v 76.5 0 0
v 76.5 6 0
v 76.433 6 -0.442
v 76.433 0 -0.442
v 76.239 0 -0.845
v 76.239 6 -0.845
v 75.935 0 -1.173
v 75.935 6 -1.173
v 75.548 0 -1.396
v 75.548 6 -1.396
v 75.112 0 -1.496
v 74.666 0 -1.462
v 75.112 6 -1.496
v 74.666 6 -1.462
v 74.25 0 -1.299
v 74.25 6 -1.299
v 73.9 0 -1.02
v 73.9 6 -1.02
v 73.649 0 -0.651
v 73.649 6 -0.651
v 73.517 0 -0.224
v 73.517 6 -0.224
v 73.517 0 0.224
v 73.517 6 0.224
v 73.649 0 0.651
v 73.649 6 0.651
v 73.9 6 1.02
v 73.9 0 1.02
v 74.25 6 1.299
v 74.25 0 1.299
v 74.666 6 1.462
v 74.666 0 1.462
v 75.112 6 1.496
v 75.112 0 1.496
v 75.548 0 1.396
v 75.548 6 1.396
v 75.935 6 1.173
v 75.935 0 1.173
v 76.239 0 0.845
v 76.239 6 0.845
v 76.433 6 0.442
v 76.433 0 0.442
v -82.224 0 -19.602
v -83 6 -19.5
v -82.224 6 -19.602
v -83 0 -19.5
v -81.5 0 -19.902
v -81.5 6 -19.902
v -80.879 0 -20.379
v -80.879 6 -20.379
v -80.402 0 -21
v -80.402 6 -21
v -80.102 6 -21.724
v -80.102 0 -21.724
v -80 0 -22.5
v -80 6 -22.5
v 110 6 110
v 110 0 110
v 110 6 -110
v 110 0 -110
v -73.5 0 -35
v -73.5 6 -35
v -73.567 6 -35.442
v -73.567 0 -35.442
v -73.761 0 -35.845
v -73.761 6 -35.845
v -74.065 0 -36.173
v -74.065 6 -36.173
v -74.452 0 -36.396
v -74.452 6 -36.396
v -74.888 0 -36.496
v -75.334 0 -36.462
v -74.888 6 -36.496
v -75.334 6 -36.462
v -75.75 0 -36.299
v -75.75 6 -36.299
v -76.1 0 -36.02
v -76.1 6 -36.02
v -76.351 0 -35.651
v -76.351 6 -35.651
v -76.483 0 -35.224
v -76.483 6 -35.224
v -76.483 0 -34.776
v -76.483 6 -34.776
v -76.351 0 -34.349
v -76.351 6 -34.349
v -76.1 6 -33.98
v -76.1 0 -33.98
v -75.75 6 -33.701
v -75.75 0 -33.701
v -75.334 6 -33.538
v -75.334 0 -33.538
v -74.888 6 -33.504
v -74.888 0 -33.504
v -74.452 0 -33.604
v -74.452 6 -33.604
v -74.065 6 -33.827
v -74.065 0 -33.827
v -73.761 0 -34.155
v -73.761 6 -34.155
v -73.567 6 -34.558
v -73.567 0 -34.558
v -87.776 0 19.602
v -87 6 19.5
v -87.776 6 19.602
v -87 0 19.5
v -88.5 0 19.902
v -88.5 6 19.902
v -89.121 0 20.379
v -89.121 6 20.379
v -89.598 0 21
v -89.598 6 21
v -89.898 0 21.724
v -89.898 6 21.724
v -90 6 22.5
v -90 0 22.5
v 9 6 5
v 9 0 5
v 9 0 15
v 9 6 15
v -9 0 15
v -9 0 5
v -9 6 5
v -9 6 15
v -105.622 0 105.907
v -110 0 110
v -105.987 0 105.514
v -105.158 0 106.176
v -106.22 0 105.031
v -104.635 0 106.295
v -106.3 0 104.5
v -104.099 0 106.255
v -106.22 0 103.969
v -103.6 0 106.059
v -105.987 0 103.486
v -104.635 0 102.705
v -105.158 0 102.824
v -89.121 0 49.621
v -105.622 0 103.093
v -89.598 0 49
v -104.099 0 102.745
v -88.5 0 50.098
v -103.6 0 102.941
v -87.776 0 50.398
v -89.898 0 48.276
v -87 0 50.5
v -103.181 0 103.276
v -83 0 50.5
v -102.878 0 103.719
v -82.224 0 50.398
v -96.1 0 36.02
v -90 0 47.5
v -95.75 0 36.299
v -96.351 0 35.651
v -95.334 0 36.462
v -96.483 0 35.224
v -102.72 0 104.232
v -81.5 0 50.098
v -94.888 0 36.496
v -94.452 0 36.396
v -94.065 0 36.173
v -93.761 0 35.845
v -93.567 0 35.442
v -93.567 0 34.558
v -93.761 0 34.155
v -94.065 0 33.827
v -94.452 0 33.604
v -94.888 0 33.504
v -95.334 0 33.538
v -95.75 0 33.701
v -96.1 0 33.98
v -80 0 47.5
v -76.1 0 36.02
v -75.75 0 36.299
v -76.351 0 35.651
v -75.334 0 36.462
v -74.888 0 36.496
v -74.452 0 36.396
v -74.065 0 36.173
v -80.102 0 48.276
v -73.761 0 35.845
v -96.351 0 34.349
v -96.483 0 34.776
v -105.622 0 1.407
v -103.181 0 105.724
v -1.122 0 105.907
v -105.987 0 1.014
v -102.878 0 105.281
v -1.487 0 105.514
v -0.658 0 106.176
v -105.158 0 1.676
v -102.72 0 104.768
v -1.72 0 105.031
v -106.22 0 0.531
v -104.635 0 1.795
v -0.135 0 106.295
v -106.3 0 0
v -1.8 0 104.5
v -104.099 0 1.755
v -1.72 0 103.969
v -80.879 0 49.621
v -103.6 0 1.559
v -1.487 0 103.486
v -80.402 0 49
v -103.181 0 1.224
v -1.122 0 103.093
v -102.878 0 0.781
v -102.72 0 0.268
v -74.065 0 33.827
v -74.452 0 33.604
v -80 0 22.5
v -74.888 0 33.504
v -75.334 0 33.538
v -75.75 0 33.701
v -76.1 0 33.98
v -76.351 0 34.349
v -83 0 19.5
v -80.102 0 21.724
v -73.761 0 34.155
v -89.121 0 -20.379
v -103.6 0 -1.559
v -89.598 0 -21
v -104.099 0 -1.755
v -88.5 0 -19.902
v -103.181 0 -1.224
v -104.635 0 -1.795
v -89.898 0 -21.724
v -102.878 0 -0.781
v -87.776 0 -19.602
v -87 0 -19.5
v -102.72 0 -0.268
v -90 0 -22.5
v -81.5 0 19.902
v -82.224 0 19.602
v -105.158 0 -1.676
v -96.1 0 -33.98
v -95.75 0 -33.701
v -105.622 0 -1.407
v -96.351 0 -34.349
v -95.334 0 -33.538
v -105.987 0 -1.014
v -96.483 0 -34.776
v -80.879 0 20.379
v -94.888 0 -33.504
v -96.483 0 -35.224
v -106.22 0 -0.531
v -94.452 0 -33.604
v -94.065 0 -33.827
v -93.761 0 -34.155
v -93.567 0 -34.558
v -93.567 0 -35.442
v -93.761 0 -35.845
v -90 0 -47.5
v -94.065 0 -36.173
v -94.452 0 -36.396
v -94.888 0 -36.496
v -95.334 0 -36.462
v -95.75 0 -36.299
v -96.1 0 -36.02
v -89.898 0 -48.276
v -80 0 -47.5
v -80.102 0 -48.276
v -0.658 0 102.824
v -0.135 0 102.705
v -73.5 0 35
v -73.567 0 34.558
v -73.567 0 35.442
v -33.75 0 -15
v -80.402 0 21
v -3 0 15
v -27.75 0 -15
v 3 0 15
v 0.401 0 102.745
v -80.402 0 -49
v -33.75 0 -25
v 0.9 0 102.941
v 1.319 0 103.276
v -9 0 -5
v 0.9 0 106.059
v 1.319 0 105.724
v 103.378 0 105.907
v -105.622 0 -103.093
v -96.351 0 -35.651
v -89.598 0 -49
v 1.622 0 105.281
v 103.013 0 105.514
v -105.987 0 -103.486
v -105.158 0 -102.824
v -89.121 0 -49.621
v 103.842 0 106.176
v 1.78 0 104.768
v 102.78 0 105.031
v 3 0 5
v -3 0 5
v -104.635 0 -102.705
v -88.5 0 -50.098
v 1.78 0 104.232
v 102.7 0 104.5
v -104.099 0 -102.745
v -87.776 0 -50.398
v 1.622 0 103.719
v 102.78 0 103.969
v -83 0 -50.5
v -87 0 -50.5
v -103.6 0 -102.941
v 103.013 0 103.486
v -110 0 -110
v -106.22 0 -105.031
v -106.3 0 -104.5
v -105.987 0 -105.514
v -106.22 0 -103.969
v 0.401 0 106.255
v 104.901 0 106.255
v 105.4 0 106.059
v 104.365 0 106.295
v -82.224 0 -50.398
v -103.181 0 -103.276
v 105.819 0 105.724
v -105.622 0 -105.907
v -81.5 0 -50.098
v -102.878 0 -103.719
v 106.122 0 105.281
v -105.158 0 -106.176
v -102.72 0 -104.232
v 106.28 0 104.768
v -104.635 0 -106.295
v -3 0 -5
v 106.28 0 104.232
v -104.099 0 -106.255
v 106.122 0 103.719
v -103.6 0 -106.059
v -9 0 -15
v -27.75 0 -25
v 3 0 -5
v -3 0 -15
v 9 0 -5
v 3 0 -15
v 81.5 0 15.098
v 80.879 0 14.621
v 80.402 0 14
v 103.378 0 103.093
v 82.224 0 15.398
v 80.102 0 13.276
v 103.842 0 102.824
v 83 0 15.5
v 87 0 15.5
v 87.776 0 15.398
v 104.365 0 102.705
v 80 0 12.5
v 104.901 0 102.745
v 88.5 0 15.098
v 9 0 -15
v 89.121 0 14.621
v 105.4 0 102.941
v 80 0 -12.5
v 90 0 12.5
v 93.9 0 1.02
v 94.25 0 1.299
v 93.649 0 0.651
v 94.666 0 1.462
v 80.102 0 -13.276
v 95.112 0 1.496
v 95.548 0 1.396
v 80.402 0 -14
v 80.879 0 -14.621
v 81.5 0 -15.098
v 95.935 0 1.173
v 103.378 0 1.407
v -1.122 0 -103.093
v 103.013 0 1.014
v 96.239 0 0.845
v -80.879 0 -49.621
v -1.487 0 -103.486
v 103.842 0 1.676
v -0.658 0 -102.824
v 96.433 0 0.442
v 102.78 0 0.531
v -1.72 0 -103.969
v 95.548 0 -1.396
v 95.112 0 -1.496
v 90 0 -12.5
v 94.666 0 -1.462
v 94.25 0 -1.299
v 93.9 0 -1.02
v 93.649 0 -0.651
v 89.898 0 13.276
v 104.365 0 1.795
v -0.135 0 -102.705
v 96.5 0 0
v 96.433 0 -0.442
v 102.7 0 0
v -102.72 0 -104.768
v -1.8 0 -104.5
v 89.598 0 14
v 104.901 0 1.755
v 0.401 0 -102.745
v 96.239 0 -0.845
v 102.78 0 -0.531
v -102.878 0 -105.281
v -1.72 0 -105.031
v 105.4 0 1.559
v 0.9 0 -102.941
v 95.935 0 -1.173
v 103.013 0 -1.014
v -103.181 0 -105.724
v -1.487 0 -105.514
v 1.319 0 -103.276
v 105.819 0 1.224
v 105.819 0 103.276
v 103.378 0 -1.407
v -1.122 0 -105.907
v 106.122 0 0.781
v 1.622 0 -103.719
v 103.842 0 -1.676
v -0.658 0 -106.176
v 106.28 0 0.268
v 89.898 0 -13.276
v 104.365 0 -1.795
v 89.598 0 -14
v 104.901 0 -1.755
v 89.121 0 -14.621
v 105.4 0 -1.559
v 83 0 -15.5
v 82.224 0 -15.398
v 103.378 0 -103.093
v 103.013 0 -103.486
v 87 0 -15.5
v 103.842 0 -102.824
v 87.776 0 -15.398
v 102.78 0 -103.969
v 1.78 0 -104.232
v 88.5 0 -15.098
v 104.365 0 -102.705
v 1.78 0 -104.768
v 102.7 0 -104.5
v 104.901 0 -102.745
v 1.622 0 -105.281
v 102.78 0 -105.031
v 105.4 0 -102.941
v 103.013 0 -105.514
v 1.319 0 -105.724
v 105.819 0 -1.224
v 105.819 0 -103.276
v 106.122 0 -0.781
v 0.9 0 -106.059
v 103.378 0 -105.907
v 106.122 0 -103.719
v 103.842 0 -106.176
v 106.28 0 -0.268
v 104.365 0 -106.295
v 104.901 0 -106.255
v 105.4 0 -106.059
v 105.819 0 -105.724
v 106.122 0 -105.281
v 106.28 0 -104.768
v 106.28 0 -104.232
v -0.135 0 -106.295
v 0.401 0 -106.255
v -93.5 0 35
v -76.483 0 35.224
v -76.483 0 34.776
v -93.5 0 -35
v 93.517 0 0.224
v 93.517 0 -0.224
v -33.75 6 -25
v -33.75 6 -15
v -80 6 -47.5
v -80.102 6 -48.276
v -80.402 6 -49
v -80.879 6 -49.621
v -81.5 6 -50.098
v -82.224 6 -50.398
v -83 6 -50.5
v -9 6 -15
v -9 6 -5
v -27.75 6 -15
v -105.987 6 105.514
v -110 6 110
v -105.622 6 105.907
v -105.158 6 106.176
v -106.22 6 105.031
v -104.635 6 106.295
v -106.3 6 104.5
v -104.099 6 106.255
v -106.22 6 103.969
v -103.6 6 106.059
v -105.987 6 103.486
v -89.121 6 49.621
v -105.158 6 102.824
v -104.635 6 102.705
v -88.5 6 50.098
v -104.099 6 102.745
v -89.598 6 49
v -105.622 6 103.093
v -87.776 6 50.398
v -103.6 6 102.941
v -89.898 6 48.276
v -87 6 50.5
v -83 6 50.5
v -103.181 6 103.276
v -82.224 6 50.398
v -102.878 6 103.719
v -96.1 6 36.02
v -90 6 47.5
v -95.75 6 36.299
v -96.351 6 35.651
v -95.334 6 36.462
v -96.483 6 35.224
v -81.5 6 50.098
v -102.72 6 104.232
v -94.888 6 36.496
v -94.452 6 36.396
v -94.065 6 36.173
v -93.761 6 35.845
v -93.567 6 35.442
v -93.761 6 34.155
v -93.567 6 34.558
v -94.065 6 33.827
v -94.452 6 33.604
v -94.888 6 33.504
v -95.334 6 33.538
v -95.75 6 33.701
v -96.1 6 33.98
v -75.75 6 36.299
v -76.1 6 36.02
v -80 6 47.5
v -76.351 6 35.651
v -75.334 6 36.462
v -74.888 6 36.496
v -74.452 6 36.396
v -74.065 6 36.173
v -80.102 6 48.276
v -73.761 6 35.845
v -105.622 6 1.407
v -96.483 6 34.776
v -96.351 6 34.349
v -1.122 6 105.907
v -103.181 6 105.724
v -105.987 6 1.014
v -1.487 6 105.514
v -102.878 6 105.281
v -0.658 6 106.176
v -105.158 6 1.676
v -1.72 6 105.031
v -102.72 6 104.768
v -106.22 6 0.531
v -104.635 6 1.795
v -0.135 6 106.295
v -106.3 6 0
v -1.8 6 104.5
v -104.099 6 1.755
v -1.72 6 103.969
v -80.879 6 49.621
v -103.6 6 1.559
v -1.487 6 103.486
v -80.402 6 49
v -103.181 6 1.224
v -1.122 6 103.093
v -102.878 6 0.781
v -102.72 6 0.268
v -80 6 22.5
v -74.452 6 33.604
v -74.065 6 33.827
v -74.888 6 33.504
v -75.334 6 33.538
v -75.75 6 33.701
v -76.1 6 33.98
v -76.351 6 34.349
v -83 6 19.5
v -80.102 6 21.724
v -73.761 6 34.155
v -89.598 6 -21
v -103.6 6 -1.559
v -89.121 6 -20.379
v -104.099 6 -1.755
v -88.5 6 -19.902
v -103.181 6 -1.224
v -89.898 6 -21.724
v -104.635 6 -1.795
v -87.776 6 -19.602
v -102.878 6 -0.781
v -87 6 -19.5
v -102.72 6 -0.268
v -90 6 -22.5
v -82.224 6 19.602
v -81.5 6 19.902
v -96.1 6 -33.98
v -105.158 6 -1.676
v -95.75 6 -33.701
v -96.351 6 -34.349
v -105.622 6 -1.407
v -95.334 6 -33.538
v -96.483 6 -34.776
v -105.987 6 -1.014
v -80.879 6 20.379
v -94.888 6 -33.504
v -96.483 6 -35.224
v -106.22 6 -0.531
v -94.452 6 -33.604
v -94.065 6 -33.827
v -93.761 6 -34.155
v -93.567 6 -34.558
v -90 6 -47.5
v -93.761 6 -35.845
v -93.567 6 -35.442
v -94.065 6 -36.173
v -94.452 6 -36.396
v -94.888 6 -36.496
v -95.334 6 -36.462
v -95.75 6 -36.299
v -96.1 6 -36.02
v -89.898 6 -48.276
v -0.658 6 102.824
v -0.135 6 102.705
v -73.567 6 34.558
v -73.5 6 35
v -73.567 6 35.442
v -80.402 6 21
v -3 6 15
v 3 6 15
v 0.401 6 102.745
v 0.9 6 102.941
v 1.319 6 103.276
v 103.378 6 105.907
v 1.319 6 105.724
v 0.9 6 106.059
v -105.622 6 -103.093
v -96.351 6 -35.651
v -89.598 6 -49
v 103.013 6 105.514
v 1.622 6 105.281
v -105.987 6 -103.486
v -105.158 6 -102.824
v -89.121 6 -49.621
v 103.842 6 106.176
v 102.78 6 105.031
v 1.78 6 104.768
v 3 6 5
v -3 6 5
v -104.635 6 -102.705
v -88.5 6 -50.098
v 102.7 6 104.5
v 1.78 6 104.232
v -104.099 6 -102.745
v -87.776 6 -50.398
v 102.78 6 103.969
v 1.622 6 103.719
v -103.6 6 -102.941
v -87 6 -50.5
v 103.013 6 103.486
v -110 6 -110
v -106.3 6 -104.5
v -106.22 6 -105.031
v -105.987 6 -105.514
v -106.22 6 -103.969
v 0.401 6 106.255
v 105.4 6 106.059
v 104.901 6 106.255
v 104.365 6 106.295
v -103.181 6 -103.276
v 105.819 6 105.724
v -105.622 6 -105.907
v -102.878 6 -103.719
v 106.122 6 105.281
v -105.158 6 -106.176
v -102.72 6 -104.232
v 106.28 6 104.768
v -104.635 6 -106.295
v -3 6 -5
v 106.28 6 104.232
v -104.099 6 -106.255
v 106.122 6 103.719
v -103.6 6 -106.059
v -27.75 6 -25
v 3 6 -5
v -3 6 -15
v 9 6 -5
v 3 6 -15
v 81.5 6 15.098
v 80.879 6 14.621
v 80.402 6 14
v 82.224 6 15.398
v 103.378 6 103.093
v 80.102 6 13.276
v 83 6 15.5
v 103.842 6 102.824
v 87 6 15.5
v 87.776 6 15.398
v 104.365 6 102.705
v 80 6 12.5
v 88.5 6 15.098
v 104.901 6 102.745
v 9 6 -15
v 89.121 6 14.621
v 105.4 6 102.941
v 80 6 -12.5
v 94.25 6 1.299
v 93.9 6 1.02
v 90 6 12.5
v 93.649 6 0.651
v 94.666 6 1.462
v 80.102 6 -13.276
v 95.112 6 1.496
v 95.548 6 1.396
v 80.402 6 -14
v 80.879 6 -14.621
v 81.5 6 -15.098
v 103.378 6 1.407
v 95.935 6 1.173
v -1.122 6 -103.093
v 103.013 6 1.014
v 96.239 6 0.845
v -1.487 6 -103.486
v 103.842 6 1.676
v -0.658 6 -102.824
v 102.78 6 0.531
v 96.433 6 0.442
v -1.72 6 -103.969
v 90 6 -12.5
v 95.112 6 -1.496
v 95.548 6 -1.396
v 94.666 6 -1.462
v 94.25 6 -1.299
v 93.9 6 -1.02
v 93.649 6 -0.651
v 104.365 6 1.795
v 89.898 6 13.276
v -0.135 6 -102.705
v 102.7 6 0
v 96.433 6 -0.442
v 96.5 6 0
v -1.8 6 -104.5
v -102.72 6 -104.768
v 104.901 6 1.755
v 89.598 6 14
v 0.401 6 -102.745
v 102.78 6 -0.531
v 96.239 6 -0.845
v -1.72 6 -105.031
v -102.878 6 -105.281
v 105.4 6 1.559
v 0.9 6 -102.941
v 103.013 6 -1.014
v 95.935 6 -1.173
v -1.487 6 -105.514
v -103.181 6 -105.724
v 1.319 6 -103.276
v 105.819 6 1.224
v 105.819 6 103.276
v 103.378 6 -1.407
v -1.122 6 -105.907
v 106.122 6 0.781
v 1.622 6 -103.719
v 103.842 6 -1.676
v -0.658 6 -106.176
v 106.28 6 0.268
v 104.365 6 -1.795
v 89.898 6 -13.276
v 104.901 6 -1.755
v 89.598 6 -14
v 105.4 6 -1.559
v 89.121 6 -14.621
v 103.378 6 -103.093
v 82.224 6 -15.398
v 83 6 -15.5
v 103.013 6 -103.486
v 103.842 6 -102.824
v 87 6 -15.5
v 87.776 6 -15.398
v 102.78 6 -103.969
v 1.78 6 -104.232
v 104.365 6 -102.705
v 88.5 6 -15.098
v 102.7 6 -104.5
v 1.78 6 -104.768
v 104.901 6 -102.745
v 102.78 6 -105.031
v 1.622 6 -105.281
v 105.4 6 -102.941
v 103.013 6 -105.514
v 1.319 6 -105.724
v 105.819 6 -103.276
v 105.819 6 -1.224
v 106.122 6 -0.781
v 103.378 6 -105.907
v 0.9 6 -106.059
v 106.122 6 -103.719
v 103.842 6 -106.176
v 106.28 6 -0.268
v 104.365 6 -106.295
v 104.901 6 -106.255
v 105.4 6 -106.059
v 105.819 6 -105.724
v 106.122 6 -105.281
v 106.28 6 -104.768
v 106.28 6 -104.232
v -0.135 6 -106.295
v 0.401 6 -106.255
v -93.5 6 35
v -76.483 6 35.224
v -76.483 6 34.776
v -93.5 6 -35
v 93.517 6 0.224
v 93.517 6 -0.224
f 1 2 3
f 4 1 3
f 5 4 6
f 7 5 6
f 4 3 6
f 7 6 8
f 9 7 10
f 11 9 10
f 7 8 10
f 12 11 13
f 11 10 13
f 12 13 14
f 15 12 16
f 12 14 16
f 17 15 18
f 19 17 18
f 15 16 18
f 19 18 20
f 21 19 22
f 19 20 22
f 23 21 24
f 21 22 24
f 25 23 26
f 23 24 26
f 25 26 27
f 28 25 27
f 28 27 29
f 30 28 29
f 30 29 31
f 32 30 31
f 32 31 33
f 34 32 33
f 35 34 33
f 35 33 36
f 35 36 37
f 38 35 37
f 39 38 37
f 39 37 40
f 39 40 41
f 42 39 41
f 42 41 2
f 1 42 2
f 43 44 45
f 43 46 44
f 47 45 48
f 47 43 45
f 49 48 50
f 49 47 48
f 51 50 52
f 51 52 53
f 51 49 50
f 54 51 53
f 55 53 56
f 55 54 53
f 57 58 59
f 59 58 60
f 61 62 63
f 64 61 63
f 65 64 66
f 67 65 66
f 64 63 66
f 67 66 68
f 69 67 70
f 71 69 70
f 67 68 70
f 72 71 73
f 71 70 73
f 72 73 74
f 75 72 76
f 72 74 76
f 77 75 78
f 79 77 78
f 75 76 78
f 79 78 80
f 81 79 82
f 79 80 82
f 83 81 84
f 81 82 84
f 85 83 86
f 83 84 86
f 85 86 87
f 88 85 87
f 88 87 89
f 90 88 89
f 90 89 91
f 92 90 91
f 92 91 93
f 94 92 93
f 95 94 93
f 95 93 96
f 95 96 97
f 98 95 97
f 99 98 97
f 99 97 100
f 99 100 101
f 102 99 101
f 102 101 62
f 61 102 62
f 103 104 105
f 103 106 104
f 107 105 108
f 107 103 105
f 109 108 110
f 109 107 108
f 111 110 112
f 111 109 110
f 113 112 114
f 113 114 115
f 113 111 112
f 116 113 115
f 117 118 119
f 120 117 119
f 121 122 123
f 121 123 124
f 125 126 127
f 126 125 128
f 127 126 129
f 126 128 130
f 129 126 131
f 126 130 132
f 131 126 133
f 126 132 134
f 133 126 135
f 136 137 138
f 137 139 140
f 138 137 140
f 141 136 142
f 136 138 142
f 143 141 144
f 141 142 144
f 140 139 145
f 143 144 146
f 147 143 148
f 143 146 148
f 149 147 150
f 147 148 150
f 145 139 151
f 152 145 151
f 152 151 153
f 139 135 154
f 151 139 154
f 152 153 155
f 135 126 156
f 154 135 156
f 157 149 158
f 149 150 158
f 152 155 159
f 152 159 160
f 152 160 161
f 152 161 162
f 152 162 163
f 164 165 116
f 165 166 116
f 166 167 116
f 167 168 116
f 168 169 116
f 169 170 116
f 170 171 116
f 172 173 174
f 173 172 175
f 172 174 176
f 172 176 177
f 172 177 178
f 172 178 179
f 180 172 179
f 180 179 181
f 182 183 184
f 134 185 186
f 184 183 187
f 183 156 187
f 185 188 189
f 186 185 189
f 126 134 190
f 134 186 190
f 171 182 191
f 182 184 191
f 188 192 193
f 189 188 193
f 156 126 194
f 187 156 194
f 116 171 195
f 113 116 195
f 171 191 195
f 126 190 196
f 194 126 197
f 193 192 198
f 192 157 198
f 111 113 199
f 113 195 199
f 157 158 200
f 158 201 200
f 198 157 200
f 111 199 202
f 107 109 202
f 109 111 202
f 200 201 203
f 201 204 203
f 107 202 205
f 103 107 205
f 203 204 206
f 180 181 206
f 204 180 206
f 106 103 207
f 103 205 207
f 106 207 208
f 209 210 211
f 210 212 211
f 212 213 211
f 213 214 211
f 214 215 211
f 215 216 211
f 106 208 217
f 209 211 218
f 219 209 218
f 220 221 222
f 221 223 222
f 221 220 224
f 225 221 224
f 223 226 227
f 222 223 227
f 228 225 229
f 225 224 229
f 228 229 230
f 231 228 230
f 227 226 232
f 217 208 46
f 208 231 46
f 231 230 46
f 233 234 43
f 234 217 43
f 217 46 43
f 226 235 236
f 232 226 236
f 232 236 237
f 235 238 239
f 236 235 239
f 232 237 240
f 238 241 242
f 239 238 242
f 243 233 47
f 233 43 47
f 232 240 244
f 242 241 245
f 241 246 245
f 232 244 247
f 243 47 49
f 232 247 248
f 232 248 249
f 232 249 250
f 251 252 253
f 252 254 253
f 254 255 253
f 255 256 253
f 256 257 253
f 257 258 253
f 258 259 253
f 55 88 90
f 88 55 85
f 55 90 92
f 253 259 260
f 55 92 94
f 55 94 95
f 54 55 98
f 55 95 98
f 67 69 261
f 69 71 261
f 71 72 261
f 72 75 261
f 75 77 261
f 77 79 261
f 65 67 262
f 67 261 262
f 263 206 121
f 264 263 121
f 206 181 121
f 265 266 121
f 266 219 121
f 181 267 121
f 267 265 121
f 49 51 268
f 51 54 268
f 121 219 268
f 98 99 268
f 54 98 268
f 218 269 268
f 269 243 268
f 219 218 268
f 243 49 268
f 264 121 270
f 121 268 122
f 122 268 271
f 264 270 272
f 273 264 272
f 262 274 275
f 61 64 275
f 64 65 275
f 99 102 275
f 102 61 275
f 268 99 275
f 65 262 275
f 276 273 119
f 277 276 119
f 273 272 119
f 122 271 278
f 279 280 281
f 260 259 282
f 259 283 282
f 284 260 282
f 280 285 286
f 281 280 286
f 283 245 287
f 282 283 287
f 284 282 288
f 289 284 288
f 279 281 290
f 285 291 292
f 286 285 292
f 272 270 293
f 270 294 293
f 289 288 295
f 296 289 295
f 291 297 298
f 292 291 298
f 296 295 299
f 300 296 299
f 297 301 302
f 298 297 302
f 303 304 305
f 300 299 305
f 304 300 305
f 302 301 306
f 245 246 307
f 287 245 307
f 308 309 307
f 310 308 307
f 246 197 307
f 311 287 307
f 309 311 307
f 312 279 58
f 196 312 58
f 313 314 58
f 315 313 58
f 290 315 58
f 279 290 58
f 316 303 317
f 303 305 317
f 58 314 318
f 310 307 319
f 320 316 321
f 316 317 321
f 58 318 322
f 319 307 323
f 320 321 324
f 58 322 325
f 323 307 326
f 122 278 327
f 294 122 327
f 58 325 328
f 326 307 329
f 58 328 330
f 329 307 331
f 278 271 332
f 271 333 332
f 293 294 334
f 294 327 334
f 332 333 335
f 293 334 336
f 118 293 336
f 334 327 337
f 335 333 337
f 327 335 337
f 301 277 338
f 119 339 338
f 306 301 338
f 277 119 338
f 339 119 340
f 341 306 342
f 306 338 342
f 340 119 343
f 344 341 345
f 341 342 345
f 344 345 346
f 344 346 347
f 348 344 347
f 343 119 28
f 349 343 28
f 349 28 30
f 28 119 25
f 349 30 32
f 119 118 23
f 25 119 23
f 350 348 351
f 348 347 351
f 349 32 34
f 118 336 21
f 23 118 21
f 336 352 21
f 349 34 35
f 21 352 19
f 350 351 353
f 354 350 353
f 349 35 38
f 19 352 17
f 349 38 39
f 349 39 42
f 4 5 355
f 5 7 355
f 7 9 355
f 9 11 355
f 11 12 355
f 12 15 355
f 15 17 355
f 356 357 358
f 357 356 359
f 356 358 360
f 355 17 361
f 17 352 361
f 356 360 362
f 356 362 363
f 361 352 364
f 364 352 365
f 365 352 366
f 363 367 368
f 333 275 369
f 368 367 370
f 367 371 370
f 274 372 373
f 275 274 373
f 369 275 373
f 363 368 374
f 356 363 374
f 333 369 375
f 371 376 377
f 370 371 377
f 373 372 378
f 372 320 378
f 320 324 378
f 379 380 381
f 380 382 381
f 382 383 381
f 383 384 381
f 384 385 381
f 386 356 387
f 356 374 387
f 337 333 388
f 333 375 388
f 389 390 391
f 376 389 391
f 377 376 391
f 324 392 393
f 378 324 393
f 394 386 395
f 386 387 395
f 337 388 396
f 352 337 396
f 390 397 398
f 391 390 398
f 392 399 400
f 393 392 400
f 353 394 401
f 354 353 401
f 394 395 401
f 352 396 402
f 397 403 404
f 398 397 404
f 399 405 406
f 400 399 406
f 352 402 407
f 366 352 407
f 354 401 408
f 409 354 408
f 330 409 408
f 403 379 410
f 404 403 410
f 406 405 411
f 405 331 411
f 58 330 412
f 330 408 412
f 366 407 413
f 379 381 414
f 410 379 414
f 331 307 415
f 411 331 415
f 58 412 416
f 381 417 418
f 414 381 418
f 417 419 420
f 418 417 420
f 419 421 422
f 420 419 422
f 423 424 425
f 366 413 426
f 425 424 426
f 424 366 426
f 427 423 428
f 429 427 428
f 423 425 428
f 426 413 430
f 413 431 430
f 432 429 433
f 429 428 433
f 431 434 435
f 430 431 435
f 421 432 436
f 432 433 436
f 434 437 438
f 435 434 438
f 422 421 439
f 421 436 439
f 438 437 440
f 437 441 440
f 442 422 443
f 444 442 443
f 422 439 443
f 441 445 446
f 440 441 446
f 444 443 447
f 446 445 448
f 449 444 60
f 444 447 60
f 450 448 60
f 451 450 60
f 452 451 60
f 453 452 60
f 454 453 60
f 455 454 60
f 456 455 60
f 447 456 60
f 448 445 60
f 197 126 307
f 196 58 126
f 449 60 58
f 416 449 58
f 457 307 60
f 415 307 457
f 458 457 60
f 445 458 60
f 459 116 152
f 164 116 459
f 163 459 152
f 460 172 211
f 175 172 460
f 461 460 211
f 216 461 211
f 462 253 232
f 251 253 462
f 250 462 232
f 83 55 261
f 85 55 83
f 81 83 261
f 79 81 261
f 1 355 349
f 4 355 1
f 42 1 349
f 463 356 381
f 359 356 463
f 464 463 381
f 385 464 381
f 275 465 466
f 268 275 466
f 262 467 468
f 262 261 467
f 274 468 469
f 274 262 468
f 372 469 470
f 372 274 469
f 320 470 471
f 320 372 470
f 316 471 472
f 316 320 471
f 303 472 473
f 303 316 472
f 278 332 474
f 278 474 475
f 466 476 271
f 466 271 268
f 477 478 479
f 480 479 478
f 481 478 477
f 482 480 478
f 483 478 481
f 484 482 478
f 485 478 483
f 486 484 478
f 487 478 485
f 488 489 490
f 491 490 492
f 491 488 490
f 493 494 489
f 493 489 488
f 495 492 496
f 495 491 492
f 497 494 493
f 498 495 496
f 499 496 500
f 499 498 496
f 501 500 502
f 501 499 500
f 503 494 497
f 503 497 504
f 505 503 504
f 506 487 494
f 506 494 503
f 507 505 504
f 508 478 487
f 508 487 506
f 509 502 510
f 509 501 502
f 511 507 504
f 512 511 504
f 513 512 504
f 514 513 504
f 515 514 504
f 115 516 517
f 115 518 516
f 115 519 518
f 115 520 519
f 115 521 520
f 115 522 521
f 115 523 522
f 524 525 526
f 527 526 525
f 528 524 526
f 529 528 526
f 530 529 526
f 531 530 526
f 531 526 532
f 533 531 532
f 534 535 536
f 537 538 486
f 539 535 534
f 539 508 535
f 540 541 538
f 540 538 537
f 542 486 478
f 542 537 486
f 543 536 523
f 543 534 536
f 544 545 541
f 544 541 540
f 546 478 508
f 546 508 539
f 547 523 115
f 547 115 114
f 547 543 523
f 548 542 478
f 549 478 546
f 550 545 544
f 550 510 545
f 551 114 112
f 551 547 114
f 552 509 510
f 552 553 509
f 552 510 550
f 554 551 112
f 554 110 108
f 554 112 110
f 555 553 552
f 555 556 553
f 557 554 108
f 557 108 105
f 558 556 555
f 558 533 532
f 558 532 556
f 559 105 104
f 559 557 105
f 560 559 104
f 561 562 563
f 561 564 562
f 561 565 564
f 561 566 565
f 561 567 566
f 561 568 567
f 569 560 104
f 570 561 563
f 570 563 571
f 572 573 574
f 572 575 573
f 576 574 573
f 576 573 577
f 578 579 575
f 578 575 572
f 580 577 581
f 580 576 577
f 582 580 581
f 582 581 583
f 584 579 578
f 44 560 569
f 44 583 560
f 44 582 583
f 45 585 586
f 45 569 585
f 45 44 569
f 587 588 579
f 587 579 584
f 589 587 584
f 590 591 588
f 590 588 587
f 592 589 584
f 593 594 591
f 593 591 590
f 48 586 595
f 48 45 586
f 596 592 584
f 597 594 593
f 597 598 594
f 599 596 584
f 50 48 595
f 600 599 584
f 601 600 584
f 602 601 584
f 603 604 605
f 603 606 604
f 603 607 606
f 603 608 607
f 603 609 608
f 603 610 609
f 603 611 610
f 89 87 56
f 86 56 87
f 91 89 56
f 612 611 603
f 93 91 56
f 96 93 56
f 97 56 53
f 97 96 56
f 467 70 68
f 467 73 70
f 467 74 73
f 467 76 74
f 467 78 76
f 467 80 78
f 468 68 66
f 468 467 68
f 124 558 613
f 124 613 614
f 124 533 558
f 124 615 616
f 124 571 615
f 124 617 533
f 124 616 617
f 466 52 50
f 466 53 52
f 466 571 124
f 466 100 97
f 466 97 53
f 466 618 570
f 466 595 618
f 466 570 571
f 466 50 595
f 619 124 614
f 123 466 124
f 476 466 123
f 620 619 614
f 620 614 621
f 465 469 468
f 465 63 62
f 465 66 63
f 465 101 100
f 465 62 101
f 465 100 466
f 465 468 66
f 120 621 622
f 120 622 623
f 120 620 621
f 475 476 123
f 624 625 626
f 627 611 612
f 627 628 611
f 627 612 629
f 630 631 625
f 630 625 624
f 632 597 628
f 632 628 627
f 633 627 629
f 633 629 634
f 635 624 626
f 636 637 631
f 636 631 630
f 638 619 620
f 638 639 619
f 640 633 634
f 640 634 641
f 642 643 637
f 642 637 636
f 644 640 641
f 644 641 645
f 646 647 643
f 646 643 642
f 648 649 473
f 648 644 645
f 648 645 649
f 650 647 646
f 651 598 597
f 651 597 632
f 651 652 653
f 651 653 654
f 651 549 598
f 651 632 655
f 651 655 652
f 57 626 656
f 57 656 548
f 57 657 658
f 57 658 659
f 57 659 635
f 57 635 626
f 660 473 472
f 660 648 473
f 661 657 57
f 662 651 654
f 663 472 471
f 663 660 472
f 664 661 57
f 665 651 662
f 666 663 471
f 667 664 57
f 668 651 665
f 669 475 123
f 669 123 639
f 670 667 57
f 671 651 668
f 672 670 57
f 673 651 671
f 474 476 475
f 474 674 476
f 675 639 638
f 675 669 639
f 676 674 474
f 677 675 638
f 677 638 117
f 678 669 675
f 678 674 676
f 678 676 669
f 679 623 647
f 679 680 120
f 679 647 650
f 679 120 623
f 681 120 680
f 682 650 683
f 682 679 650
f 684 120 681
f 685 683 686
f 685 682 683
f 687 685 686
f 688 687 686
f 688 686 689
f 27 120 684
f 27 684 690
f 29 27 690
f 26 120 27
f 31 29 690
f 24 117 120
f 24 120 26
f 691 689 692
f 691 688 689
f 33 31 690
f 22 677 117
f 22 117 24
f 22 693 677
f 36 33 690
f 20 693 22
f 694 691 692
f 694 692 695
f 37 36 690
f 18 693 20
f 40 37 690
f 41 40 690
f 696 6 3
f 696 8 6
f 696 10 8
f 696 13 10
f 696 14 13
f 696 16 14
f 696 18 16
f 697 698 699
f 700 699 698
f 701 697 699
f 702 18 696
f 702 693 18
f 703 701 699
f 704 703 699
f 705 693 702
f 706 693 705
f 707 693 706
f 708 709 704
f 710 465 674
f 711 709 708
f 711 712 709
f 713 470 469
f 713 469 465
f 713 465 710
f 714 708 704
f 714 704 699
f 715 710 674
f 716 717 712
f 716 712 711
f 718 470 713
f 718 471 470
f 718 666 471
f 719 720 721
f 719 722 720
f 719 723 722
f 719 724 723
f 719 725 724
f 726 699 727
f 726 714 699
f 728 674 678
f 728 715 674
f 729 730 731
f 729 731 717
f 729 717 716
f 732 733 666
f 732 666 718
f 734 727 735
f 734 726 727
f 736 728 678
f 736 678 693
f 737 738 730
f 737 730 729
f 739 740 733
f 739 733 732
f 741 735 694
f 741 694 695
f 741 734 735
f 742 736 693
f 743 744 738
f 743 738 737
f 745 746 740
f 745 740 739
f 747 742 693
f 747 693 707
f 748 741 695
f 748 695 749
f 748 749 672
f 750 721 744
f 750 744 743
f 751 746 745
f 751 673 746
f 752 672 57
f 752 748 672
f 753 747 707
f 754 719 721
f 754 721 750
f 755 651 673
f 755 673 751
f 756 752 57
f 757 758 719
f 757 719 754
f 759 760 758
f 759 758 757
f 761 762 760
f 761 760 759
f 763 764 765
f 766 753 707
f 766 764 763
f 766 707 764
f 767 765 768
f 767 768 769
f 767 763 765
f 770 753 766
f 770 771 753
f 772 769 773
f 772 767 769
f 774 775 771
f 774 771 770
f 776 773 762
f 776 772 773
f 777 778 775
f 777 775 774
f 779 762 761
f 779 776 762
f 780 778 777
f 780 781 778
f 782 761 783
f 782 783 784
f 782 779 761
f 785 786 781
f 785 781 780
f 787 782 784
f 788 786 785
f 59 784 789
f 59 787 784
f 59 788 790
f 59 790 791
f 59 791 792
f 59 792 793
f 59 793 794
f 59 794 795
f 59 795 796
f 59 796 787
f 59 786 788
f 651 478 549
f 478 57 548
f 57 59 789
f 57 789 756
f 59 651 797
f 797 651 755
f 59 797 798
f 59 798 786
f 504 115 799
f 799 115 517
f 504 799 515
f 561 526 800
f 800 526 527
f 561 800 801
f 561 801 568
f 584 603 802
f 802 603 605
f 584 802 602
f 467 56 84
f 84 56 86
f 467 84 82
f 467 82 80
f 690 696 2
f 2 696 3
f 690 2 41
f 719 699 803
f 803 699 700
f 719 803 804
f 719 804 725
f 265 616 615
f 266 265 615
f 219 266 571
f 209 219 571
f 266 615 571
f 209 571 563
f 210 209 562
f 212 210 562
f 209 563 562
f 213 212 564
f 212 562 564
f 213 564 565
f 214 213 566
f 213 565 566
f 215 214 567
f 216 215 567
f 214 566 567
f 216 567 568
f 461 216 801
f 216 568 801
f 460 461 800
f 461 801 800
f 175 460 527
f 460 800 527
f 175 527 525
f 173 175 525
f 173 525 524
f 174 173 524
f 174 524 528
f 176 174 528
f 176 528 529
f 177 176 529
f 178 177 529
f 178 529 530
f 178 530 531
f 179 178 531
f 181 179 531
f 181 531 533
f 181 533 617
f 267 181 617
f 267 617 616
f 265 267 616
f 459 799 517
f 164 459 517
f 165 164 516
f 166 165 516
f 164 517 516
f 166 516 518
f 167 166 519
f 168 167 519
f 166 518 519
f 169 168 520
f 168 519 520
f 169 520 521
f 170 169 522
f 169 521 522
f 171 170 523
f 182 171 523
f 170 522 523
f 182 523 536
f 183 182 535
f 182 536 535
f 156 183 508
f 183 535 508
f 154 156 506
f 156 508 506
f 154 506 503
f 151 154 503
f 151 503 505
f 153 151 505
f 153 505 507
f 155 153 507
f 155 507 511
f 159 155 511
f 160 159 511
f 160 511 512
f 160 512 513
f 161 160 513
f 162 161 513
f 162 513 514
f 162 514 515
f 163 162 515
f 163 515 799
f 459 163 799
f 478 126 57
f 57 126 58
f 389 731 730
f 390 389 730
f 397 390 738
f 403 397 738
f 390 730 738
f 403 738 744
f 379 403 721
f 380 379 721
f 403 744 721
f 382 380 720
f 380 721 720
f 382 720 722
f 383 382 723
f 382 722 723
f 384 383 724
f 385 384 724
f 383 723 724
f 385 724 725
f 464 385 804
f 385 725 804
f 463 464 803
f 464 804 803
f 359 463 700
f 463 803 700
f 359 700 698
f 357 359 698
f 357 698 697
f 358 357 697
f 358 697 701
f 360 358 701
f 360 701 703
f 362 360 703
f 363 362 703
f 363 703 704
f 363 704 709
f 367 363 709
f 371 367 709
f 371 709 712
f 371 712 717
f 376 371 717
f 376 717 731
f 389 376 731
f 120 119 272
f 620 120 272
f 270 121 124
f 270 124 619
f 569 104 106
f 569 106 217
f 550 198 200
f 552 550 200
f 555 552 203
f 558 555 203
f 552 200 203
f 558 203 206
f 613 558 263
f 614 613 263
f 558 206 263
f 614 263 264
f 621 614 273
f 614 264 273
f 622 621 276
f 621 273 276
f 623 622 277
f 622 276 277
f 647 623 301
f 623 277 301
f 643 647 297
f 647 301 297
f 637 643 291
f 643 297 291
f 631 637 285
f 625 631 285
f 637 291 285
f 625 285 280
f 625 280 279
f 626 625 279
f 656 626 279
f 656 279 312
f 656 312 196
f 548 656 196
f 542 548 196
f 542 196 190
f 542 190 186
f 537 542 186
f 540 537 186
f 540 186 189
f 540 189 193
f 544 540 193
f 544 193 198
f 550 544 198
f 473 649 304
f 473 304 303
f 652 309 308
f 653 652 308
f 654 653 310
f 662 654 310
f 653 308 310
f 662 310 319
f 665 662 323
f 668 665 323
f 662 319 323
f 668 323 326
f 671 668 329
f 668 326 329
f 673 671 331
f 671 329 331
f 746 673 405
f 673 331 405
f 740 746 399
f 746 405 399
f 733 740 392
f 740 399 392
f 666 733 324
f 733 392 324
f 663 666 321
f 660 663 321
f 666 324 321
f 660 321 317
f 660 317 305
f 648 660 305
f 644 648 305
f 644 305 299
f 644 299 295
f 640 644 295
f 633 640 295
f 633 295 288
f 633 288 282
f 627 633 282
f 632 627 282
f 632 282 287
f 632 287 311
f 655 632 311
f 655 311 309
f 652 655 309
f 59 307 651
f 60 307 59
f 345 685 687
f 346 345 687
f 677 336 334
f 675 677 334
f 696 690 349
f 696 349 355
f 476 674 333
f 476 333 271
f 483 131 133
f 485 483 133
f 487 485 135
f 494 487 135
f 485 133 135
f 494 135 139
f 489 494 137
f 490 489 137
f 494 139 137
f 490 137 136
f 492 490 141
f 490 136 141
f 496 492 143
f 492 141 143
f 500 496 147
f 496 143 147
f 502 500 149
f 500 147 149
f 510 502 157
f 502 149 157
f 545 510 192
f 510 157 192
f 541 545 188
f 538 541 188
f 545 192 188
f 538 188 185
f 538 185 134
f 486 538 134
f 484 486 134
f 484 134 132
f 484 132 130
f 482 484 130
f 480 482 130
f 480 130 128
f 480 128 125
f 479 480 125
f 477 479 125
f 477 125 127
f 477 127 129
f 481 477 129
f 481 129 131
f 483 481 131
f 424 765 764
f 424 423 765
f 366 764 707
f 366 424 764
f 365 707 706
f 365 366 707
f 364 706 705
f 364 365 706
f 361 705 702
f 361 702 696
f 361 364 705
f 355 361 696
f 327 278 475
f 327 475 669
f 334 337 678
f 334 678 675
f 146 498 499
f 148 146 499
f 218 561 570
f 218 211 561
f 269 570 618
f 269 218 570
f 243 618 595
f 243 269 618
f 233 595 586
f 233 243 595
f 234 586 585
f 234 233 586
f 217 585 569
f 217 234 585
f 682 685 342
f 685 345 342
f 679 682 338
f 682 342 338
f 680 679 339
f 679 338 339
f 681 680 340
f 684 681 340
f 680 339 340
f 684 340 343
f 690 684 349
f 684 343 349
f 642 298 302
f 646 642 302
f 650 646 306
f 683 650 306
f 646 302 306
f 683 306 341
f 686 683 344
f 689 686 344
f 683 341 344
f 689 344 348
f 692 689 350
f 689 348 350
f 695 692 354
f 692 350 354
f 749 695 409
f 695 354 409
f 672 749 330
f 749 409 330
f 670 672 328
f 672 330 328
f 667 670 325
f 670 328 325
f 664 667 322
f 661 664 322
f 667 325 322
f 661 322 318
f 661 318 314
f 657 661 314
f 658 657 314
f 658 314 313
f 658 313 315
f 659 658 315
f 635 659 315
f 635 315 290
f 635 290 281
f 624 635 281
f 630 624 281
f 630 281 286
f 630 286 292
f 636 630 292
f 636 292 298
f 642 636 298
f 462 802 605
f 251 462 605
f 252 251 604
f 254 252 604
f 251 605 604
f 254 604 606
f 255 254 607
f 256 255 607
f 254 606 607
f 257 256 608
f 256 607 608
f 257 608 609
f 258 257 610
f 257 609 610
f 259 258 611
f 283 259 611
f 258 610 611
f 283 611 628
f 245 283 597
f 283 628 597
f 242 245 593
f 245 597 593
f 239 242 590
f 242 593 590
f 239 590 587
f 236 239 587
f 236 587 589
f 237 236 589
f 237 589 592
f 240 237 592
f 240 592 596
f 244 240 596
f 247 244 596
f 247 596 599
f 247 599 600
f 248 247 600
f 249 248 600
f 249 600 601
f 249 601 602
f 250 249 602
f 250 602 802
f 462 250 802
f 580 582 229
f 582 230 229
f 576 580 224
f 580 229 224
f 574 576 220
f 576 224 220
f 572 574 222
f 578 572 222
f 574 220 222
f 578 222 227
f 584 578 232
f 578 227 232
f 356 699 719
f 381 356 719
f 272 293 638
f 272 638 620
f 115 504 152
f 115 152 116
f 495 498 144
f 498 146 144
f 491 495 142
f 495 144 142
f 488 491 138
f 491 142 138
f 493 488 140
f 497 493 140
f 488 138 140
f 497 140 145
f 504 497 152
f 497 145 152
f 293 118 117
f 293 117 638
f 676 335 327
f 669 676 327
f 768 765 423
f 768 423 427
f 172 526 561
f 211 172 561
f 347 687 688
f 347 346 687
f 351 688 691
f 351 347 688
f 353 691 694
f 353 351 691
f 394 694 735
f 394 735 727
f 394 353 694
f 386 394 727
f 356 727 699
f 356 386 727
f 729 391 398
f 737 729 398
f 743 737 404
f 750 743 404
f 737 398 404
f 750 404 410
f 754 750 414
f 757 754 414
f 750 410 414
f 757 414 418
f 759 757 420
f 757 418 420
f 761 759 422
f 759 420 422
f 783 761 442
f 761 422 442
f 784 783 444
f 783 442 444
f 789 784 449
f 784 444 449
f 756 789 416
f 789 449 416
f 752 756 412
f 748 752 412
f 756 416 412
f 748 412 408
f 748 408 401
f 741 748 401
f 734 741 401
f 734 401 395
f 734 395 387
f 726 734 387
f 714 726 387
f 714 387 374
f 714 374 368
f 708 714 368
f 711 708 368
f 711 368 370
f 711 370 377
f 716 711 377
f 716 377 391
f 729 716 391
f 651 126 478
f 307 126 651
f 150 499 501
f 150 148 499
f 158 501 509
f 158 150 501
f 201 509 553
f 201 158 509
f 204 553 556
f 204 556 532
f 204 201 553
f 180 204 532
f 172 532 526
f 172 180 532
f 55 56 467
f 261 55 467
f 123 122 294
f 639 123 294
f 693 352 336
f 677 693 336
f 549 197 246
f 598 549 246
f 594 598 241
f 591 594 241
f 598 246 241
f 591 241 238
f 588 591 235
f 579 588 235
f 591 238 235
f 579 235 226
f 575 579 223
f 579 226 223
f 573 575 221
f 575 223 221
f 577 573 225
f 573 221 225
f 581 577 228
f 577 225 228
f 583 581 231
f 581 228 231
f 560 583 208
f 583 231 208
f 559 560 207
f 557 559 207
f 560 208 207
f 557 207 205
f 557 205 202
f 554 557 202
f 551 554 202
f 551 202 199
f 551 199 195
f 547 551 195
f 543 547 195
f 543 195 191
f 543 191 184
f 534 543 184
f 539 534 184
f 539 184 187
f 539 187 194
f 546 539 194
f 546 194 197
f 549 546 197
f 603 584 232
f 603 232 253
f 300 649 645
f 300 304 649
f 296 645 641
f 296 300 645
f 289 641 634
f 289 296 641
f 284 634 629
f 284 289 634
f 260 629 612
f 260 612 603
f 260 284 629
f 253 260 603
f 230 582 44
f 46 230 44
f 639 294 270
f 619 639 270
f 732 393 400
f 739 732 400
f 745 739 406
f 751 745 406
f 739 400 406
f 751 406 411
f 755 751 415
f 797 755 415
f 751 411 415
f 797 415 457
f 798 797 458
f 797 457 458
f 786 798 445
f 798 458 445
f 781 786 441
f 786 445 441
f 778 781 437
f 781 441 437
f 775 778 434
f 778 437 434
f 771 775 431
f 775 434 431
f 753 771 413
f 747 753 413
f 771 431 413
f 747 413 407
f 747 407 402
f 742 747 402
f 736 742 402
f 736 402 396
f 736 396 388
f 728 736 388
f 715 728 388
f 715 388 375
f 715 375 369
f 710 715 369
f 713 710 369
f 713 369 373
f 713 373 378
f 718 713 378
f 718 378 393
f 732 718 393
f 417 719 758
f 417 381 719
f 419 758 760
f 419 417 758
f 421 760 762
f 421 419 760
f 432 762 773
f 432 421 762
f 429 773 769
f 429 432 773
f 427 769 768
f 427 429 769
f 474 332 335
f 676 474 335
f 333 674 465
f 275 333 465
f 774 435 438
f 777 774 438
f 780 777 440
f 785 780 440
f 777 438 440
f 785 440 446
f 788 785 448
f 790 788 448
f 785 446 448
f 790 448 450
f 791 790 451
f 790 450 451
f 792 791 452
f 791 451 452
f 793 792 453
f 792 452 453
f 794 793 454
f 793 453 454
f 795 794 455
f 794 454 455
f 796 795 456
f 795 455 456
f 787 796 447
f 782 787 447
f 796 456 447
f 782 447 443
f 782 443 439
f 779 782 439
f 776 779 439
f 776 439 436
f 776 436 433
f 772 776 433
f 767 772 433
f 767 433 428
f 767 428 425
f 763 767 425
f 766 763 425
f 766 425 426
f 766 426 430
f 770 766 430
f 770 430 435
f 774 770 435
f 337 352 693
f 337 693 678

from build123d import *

# Parameters (mm, degrees)
SKETCH1_W                  = 220
SKETCH1_H                  = 220
BOSS_EXTRUDE1_DEPTH        = 6
SKETCH2_R                  = 1.5
SKETCH2_W                  = 10
SKETCH2_H                  = 31
CUT_EXTRUDE1_DEPTH         = 7
FILLET1_R                  = 3
SKETCH5_R                  = 1.5
SKETCH5_W                  = 10
SKETCH5_H                  = 31
CUT_EXTRUDE3_DEPTH         = 7
FILLET2_R                  = 3
SKETCH7_R                  = 1.5
SKETCH7_W                  = 10
SKETCH7_H                  = 31
CUT_EXTRUDE4_DEPTH         = 7
FILLET3_R                  = 3
F_3_6_3_6_DIAMETER_HOLE1_D = 3.6
SKETCH6_W                  = 10
SKETCH6_H                  = 6
CUT_EXTRUDE12_DEPTH        = 4
SKETCH61_W                 = 10
SKETCH61_H                 = 6
CUT_EXTRUDE13_DEPTH        = 4
SKETCH65_W                 = 10
SKETCH65_H                 = 6
CUT_EXTRUDE16_DEPTH        = 4
CUT_EXTRUDE16_DEPTH_BACK   = 4


with BuildPart() as part:
    # Sketch1 → Boss-Extrude1 (new body)
    with BuildSketch(Plane(origin=(0, 0, 0), x_dir=(1, 0, 0), z_dir=(0, 1, 0))):
        Rectangle(SKETCH1_W, SKETCH1_H)
    extrude(amount=BOSS_EXTRUDE1_DEPTH)

    # Sketch2 → Cut-Extrude1 (cut, through all)
    with BuildSketch(Plane(origin=(0, 6, 0), x_dir=(1, 0, 0), z_dir=(0, 1, 0))):
        with Locations((-95, 35)):
            Circle(SKETCH2_R)
        with Locations((-75, 35)):
            Circle(SKETCH2_R)
        with Locations((-85, 35)):
            Rectangle(SKETCH2_W, SKETCH2_H)
    extrude(amount=-CUT_EXTRUDE1_DEPTH, mode=Mode.SUBTRACT)

    # Fillet1
    fillet1_edges = [part.edges().sort_by_distance(p)[0] for p in [
        (-80, 3, -50.5),
        (-80, 3, -19.5),
        (-90, 3, -19.5),
        (-90, 3, -50.5),
    ]]
    fillet(fillet1_edges, radius=FILLET1_R)

    # Sketch5 → Cut-Extrude3 (cut, through all)
    with BuildSketch(Plane(origin=(45.510619452, 6, 46.414764374), x_dir=(1, 0, 0), z_dir=(0, 1, 0))):
        with Locations((-140.510619452, 11.414764374)):
            Circle(SKETCH5_R)
        with Locations((-120.510619452, 11.414764374)):
            Circle(SKETCH5_R)
        with Locations((-130.510619452, 11.414764374)):
            Rectangle(SKETCH5_W, SKETCH5_H)
    extrude(amount=-CUT_EXTRUDE3_DEPTH, mode=Mode.SUBTRACT)

    # Fillet2
    fillet2_edges = [part.edges().sort_by_distance(p)[0] for p in [
        (-80, 3, 19.5),
        (-80, 3, 50.5),
        (-90, 3, 50.5),
        (-90, 3, 19.5),
    ]]
    fillet(fillet2_edges, radius=FILLET2_R)

    # Sketch7 → Cut-Extrude4 (cut, through all)
    with BuildSketch(Plane(origin=(105.138163787, 6, 83.209962186), x_dir=(1, 0, 0), z_dir=(0, 1, 0))):
        with Locations((-30.138163787, 83.209962186)):
            Circle(SKETCH7_R)
        with Locations((-10.138163787, 83.209962186)):
            Circle(SKETCH7_R)
        with Locations((-20.138163787, 83.209962186)):
            Rectangle(SKETCH7_W, SKETCH7_H)
    extrude(amount=-CUT_EXTRUDE4_DEPTH, mode=Mode.SUBTRACT)

    # Fillet3
    fillet3_edges = [part.edges().sort_by_distance(p)[0] for p in [
        (90, 3, -15.5),
        (90, 3, 15.5),
        (80, 3, 15.5),
        (80, 3, -15.5),
    ]]
    fillet(fillet3_edges, radius=FILLET3_R)

    # Ø3.6 (3.6) Diameter Hole1 (through all)
    with Locations(Plane(origin=(0, 6, 0), x_dir=(1, 0, 0), z_dir=(0, 1, 0))):
        with Locations((-104.5, -104.5), (0, -104.5), (104.5, -104.5), (104.5, 0), (104.5, 104.5), (0, 104.5), (-104.5, 104.5), (-104.5, 0)):
            Hole(F_3_6_3_6_DIAMETER_HOLE1_D / 2)

    # Sketch6 → Cut-Extrude12 (cut, symmetric)
    with BuildSketch(Plane(origin=(-38, 3, -10.767778608), x_dir=(0, 0, 1), z_dir=(0, -1, 0))):
        with Locations((0.767778608, -44)):
            Rectangle(SKETCH6_W, SKETCH6_H)
    cut_extrude12 = extrude(amount=CUT_EXTRUDE12_DEPTH, both=True, mode=Mode.SUBTRACT)

    # Sketch61 → Cut-Extrude13 (cut, symmetric)
    with BuildSketch(Plane(origin=(-38, 3, 9.232221392), x_dir=(0, 0, 1), z_dir=(0, -1, 0))):
        with Locations((0.767778608, -44)):
            Rectangle(SKETCH61_W, SKETCH61_H)
    cut_extrude13 = extrude(amount=CUT_EXTRUDE13_DEPTH, both=True, mode=Mode.SUBTRACT)

    # Mirror1: Cut-Extrude12, Cut-Extrude13 across plane
    add(cut_extrude12.mirror(Plane(origin=(0, 0, 0), x_dir=(0, 0, 1), z_dir=(1, 0, 0))), mode=Mode.SUBTRACT)
    add(cut_extrude13.mirror(Plane(origin=(0, 0, 0), x_dir=(0, 0, 1), z_dir=(1, 0, 0))), mode=Mode.SUBTRACT)

    # Sketch65 → Cut-Extrude16 (cut, two sides)
    with BuildSketch(Plane(origin=(-74.75, 3, -20.767778608), x_dir=(0, 0, 1), z_dir=(0, -1, 0))) as cut_extrude16_sk:
        with Locations((0.767778608, -44)):
            Rectangle(SKETCH65_W, SKETCH65_H)
    extrude(amount=CUT_EXTRUDE16_DEPTH, mode=Mode.SUBTRACT)
    extrude(cut_extrude16_sk.sketch, amount=-CUT_EXTRUDE16_DEPTH_BACK, mode=Mode.SUBTRACT)


solid = part.part
